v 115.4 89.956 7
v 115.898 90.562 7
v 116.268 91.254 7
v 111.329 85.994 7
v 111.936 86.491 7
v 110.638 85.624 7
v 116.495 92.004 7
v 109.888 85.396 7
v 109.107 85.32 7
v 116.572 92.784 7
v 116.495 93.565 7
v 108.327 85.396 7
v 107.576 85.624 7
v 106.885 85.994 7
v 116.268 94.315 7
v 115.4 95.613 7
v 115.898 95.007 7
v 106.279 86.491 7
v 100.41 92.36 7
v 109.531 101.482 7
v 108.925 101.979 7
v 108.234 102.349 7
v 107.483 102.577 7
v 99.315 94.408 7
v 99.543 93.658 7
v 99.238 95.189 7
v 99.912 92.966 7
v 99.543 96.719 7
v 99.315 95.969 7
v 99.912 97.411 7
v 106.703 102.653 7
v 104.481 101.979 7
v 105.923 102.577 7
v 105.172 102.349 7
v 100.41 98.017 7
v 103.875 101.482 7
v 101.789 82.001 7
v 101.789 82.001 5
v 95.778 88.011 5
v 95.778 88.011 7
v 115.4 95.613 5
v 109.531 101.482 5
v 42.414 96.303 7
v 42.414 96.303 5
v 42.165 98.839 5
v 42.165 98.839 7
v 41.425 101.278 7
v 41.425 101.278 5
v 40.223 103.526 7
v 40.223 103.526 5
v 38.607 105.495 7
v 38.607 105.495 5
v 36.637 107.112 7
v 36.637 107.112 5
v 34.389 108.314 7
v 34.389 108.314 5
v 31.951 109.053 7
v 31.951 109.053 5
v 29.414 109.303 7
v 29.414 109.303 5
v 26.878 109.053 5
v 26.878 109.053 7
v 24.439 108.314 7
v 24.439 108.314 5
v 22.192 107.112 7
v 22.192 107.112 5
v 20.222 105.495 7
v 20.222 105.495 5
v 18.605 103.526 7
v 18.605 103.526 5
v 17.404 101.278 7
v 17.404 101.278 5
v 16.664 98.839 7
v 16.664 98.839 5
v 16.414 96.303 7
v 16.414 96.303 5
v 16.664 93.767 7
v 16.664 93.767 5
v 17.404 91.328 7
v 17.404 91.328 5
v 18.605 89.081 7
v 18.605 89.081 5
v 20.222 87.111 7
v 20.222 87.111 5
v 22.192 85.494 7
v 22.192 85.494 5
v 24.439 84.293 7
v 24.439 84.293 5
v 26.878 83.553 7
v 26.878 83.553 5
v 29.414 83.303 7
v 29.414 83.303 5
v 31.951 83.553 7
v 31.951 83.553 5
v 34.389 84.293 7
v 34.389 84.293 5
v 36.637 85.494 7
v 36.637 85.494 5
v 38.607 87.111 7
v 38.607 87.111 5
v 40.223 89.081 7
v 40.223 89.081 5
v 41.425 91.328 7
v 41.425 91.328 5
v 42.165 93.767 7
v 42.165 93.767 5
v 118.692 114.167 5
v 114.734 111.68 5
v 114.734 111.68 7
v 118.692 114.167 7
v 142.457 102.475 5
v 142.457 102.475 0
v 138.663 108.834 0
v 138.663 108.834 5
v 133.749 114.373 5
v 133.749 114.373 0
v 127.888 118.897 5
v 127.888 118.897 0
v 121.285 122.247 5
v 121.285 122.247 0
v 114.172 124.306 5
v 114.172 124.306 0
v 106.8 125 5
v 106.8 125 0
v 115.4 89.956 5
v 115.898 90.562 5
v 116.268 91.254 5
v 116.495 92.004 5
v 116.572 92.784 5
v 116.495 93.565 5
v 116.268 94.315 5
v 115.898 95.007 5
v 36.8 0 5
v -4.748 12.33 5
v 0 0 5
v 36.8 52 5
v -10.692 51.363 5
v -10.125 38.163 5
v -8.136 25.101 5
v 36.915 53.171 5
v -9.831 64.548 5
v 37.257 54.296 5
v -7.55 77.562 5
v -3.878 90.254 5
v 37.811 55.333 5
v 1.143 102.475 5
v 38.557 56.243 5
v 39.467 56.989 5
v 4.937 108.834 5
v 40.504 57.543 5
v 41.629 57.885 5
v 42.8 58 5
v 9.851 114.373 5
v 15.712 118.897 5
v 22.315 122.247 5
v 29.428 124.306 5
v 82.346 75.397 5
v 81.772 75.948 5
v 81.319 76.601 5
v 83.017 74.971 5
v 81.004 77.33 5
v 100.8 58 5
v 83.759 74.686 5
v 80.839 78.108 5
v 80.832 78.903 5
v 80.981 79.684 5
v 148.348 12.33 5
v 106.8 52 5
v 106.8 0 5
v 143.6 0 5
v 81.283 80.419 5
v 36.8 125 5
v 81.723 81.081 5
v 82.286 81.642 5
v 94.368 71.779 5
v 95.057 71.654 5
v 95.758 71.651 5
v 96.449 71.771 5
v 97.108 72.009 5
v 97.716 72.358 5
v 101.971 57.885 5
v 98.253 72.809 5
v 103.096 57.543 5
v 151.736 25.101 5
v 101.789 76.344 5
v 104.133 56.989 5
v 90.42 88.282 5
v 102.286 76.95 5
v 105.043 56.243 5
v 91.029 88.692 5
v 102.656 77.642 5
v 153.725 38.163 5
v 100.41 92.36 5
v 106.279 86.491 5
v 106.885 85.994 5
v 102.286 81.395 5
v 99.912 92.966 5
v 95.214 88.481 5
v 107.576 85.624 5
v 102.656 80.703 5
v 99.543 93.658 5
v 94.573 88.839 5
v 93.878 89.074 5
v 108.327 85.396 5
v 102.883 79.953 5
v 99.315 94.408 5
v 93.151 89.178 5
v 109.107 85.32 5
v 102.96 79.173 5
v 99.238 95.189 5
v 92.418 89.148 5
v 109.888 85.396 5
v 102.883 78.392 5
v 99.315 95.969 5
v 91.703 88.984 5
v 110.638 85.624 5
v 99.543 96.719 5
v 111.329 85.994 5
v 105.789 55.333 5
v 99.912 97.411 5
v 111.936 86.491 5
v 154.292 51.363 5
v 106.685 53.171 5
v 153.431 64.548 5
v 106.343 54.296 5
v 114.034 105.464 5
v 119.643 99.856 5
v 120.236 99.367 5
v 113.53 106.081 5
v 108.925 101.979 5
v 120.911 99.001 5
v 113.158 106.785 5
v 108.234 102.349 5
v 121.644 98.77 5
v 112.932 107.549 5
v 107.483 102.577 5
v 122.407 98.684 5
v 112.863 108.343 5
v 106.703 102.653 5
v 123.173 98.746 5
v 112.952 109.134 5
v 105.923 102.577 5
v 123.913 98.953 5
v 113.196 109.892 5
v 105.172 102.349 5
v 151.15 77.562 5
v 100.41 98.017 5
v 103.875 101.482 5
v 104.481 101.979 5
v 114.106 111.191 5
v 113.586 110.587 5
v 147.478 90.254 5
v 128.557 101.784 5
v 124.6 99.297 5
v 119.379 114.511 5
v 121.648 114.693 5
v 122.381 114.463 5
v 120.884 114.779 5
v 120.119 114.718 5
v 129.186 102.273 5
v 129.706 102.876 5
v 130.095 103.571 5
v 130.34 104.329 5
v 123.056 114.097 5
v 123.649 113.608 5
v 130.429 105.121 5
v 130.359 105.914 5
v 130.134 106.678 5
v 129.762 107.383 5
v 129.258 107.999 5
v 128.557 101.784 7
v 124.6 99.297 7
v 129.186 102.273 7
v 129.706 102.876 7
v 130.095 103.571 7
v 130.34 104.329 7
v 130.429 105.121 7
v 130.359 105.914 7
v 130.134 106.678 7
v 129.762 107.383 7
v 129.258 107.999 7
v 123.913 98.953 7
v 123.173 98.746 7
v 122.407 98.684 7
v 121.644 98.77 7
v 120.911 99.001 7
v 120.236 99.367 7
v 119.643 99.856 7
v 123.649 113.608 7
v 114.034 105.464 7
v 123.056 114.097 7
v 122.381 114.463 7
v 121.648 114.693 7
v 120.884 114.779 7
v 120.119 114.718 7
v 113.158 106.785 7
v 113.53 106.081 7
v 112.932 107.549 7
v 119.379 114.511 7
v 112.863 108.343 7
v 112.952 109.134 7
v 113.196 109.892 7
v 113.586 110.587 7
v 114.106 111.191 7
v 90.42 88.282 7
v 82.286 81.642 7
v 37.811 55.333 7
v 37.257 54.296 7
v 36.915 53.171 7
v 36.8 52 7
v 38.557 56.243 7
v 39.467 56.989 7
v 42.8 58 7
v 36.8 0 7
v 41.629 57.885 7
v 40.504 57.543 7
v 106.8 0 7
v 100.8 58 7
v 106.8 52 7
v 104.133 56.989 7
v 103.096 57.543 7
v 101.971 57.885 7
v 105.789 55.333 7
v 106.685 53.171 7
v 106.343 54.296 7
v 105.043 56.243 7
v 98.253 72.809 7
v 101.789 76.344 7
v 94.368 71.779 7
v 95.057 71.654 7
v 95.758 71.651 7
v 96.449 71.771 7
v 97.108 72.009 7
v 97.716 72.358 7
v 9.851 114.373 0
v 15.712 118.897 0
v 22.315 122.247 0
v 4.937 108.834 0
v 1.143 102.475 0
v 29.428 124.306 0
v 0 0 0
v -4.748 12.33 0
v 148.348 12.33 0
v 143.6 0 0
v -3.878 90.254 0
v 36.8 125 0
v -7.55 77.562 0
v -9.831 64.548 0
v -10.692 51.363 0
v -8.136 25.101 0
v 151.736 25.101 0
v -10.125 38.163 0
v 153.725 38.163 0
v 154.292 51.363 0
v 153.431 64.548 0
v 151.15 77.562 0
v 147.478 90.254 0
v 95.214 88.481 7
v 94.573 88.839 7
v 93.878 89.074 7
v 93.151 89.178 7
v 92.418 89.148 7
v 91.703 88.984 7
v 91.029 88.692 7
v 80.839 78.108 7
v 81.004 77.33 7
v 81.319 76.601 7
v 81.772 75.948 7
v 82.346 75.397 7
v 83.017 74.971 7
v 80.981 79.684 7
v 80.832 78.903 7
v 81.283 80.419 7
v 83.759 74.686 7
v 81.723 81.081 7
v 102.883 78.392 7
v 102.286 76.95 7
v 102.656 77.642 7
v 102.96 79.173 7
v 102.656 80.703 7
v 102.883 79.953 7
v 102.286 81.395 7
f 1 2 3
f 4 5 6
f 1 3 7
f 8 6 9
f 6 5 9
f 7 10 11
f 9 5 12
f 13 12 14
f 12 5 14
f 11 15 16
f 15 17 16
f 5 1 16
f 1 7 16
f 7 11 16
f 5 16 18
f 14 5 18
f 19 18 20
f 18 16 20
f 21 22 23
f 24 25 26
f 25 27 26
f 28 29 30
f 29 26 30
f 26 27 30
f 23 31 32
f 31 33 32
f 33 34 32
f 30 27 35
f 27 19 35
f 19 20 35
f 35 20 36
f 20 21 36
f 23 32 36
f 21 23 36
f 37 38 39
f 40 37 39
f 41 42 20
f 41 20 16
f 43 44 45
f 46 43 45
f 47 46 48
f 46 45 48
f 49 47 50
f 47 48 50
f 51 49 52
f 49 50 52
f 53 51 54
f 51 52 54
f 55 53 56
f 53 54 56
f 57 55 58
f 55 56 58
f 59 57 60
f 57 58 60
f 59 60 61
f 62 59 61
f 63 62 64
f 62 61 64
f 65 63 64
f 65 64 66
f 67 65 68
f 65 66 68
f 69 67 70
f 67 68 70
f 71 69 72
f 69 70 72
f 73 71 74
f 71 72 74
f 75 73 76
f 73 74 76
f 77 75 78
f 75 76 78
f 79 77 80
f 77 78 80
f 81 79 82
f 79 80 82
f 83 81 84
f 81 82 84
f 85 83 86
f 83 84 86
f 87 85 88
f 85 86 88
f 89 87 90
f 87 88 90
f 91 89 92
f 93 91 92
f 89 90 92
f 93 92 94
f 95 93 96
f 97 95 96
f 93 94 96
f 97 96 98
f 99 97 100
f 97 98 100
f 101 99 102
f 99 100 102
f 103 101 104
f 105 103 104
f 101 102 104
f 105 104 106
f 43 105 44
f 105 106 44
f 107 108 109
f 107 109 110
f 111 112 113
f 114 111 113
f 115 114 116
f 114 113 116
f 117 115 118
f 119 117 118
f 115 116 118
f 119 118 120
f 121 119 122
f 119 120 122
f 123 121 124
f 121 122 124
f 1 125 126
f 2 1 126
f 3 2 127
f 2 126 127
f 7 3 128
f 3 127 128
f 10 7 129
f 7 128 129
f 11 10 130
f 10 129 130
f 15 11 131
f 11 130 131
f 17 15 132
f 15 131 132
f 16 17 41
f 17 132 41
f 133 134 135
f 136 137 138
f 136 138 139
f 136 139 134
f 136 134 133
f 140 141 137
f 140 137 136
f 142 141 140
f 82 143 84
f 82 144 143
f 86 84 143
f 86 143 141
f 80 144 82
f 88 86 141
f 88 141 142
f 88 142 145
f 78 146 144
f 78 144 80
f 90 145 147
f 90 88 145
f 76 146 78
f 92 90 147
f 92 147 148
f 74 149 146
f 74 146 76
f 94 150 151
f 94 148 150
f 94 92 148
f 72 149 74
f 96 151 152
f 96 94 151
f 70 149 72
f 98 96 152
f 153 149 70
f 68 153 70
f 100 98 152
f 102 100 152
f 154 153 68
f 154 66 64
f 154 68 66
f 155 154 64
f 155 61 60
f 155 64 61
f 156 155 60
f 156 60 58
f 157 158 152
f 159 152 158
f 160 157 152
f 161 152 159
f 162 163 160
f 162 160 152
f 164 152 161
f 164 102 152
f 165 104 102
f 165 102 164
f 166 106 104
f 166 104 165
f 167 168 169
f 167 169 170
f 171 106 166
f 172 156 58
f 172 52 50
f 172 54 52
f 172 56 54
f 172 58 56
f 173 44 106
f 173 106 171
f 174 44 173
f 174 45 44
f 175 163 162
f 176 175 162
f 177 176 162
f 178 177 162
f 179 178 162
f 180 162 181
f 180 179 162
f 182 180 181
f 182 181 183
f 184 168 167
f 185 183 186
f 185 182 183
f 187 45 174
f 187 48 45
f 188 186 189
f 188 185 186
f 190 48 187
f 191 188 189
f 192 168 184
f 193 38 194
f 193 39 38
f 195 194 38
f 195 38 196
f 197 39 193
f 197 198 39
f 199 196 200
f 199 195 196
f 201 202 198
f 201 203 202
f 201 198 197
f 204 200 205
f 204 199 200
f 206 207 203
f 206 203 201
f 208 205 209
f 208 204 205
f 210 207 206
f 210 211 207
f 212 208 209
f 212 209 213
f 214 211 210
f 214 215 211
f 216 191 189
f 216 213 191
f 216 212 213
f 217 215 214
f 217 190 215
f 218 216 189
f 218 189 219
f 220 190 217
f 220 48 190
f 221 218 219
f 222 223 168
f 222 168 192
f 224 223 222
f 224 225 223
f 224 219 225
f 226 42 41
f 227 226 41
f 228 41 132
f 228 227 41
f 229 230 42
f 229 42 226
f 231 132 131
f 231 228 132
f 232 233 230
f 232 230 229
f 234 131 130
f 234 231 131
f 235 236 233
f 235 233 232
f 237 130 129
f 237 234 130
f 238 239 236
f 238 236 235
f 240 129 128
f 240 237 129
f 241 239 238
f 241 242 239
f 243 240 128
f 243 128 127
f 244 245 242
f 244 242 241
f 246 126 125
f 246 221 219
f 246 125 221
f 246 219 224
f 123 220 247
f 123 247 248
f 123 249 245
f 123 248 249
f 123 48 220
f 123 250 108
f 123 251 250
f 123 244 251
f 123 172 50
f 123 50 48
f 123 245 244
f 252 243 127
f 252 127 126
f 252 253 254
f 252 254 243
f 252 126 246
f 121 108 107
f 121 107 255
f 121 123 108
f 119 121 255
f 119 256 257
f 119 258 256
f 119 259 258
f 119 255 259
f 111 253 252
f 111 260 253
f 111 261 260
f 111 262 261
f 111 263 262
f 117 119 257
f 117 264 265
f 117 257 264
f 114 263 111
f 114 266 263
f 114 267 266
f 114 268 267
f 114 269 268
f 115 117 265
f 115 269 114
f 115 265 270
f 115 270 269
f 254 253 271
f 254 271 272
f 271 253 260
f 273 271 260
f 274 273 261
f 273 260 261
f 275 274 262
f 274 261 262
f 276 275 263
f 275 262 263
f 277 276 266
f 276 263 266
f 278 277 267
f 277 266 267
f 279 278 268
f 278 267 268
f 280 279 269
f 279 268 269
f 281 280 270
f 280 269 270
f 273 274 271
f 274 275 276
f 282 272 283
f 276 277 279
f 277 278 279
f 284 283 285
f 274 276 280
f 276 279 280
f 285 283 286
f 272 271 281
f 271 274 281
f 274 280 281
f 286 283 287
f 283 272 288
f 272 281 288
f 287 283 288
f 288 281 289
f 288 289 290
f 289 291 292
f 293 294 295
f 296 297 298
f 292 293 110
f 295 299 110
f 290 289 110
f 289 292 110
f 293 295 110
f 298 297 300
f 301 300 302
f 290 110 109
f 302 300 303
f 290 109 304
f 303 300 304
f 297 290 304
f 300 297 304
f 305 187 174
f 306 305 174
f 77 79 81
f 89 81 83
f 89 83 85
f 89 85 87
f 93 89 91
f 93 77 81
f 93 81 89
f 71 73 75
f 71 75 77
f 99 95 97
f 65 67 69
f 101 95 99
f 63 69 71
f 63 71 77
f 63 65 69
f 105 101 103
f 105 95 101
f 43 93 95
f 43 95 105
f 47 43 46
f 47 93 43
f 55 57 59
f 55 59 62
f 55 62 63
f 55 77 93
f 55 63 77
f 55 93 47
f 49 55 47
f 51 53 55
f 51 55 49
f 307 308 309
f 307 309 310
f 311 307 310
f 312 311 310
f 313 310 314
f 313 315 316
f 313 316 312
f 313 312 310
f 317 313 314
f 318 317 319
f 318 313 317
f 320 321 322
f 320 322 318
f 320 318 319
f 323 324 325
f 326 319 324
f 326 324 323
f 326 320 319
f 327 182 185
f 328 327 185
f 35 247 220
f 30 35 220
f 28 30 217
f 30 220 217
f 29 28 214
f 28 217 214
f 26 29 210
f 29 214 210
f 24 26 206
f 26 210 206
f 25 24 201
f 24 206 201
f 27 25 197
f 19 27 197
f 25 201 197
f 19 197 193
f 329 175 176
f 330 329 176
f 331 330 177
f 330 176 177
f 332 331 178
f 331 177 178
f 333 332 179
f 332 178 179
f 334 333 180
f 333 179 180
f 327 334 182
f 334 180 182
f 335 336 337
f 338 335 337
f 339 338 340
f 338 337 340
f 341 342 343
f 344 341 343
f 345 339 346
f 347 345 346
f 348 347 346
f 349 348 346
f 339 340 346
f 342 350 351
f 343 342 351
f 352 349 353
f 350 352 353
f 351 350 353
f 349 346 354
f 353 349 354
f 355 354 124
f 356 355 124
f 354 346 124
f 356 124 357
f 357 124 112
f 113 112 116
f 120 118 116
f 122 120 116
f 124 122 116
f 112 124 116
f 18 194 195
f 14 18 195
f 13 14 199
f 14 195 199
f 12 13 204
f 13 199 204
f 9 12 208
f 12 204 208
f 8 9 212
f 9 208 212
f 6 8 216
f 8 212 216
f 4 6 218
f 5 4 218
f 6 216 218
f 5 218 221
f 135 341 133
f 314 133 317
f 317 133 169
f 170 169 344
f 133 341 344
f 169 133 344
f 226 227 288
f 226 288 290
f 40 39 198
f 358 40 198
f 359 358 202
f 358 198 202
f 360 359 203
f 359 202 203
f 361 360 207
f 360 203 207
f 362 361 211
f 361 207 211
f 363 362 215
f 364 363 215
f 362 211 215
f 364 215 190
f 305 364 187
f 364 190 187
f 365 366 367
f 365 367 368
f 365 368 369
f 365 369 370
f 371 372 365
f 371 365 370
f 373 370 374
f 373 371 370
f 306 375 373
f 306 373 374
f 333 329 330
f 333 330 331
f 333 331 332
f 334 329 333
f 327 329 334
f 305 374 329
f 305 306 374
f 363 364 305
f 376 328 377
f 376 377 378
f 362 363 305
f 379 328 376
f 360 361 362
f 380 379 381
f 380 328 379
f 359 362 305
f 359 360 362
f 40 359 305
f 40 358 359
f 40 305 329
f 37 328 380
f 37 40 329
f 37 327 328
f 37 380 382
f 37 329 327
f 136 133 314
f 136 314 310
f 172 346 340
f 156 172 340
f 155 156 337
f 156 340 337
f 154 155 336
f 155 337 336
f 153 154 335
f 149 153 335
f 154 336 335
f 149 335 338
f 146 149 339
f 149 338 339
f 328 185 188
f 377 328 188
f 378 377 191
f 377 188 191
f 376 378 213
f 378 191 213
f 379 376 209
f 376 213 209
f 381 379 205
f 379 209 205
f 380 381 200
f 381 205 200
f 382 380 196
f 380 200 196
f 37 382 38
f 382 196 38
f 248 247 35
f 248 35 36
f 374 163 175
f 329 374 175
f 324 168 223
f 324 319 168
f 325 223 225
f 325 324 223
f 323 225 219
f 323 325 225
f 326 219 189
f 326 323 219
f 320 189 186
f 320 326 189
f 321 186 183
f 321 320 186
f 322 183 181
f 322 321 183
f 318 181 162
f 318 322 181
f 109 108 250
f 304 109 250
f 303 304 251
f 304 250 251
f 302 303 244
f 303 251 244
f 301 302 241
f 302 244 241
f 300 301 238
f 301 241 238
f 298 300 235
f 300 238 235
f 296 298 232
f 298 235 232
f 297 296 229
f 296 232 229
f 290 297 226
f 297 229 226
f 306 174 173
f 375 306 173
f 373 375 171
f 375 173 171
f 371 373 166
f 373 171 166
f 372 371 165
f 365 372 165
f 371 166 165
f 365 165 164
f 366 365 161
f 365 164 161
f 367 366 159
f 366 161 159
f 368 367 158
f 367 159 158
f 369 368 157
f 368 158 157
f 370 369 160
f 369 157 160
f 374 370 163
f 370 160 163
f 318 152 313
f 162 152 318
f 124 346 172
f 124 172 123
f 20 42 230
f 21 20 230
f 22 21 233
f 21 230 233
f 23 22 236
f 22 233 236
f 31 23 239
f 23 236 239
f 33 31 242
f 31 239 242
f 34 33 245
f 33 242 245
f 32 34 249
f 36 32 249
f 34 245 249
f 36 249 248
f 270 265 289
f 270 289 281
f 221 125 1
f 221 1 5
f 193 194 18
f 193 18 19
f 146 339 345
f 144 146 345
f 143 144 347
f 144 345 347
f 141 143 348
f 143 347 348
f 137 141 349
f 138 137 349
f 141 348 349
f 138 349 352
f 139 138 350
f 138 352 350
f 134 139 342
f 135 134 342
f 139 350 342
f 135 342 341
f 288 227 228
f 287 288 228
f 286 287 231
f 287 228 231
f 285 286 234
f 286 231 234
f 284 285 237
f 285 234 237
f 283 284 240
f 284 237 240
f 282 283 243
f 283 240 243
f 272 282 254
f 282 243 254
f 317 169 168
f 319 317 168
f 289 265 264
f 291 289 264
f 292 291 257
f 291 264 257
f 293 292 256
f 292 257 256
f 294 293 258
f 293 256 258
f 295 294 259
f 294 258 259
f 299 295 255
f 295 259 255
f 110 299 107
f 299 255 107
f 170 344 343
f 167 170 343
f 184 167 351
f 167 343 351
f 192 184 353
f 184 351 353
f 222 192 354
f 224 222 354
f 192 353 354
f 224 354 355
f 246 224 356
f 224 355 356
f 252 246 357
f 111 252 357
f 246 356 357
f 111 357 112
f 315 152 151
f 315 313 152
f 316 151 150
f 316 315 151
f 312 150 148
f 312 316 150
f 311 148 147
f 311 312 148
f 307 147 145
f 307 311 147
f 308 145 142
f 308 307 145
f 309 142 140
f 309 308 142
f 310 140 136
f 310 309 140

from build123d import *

# Parameters (mm, degrees)
PAD_DEPTH    = 5
SKETCH001_R  = 13
SKETCH001_W  = 70
SKETCH001_H  = 58
PAD001_DEPTH = 2
FILLET_R     = 6


with BuildPart() as part:
    # Sketch → Pad (new body)
    with BuildSketch(Plane.XY):
        with BuildLine():
            ThreePointArc((1.143406, 102.474844), (-10.692396, 51.363106), (0, 0))
            Line((0, 0), (143.6, 0))
            ThreePointArc((143.6, 0), (154.292396, 51.363106), (142.456594, 102.474844))
            ThreePointArc((142.456594, 102.474844), (127.887765, 118.897055), (106.8, 125))
            Line((36.8, 125), (106.8, 125))
            ThreePointArc((36.8, 125), (15.712235, 118.897055), (1.143406, 102.474844))
        make_face()
    extrude(amount=PAD_DEPTH)

    # Sketch001 (on Face8 of Pad) → Pad001 (join)
    with BuildSketch(Plane.XY.offset(5)):
        with Locations((29.414366, 96.303098)):
            Circle(SKETCH001_R)
        with BuildLine():
            Line((114.734451, 111.679694), (118.692177, 114.166539))
            ThreePointArc((123.648757, 113.608086), (121.268173, 114.754509), (118.692177, 114.166539))
            Line((123.648757, 113.608086), (129.257643, 107.9992))
            ThreePointArc((128.55737, 101.783892), (130.404067, 104.72293), (129.257643, 107.9992))
            Line((128.55737, 101.783892), (124.599644, 99.297046))
            ThreePointArc((119.643063, 99.8555), (122.023647, 98.709076), (124.599644, 99.297046))
            Line((119.643063, 99.8555), (114.034177, 105.464386))
            ThreePointArc((114.734451, 111.679694), (112.887754, 108.740656), (114.034177, 105.464386))
        make_face()
        with BuildLine():
            Line((100.409759, 98.017022), (103.874582, 101.481845))
            ThreePointArc((109.531436, 101.481845), (106.703009, 102.653418), (103.874582, 101.481845))
            Line((109.531436, 101.481845), (115.400423, 95.612859))
            ThreePointArc((115.400423, 89.956005), (116.571995, 92.784432), (115.400423, 95.612859))
            Line((115.400423, 89.956005), (111.935599, 86.491182))
            ThreePointArc((106.278745, 86.491182), (109.107172, 85.319609), (111.935599, 86.491182))
            Line((106.278745, 86.491182), (100.409759, 92.360168))
            ThreePointArc((100.409759, 98.017022), (99.238186, 95.188595), (100.409759, 92.360168))
        make_face()
        with BuildLine():
            Line((90.420412, 88.28179), (82.286178, 81.642193))
            ThreePointArc((82.286178, 81.642193), (80.902255, 77.715104), (83.758696, 74.68558))
            Line((83.758696, 74.68558), (94.367803, 71.779235))
            ThreePointArc((94.367803, 71.779235), (96.449132, 71.770511), (98.253083, 72.808665))
            Line((98.253083, 72.808665), (101.788617, 76.344199))
            ThreePointArc((101.788617, 76.344199), (102.96019, 79.172626), (101.788617, 82.001054))
            Line((101.788617, 82.001054), (95.778209, 88.011461))
            ThreePointArc((95.778209, 88.011461), (93.151347, 89.177952), (90.420412, 88.28179))
        make_face()
        with Locations((71.8, 29)):
            Rectangle(SKETCH001_W, SKETCH001_H)
    extrude(amount=PAD001_DEPTH)

    # Fillet
    fillet_edges = [part.edges().sort_by_distance(p)[0] for p in [
        (36.8, 58, 6),
        (106.8, 58, 6),
    ]]
    fillet(fillet_edges, radius=FILLET_R)


solid = part.part
